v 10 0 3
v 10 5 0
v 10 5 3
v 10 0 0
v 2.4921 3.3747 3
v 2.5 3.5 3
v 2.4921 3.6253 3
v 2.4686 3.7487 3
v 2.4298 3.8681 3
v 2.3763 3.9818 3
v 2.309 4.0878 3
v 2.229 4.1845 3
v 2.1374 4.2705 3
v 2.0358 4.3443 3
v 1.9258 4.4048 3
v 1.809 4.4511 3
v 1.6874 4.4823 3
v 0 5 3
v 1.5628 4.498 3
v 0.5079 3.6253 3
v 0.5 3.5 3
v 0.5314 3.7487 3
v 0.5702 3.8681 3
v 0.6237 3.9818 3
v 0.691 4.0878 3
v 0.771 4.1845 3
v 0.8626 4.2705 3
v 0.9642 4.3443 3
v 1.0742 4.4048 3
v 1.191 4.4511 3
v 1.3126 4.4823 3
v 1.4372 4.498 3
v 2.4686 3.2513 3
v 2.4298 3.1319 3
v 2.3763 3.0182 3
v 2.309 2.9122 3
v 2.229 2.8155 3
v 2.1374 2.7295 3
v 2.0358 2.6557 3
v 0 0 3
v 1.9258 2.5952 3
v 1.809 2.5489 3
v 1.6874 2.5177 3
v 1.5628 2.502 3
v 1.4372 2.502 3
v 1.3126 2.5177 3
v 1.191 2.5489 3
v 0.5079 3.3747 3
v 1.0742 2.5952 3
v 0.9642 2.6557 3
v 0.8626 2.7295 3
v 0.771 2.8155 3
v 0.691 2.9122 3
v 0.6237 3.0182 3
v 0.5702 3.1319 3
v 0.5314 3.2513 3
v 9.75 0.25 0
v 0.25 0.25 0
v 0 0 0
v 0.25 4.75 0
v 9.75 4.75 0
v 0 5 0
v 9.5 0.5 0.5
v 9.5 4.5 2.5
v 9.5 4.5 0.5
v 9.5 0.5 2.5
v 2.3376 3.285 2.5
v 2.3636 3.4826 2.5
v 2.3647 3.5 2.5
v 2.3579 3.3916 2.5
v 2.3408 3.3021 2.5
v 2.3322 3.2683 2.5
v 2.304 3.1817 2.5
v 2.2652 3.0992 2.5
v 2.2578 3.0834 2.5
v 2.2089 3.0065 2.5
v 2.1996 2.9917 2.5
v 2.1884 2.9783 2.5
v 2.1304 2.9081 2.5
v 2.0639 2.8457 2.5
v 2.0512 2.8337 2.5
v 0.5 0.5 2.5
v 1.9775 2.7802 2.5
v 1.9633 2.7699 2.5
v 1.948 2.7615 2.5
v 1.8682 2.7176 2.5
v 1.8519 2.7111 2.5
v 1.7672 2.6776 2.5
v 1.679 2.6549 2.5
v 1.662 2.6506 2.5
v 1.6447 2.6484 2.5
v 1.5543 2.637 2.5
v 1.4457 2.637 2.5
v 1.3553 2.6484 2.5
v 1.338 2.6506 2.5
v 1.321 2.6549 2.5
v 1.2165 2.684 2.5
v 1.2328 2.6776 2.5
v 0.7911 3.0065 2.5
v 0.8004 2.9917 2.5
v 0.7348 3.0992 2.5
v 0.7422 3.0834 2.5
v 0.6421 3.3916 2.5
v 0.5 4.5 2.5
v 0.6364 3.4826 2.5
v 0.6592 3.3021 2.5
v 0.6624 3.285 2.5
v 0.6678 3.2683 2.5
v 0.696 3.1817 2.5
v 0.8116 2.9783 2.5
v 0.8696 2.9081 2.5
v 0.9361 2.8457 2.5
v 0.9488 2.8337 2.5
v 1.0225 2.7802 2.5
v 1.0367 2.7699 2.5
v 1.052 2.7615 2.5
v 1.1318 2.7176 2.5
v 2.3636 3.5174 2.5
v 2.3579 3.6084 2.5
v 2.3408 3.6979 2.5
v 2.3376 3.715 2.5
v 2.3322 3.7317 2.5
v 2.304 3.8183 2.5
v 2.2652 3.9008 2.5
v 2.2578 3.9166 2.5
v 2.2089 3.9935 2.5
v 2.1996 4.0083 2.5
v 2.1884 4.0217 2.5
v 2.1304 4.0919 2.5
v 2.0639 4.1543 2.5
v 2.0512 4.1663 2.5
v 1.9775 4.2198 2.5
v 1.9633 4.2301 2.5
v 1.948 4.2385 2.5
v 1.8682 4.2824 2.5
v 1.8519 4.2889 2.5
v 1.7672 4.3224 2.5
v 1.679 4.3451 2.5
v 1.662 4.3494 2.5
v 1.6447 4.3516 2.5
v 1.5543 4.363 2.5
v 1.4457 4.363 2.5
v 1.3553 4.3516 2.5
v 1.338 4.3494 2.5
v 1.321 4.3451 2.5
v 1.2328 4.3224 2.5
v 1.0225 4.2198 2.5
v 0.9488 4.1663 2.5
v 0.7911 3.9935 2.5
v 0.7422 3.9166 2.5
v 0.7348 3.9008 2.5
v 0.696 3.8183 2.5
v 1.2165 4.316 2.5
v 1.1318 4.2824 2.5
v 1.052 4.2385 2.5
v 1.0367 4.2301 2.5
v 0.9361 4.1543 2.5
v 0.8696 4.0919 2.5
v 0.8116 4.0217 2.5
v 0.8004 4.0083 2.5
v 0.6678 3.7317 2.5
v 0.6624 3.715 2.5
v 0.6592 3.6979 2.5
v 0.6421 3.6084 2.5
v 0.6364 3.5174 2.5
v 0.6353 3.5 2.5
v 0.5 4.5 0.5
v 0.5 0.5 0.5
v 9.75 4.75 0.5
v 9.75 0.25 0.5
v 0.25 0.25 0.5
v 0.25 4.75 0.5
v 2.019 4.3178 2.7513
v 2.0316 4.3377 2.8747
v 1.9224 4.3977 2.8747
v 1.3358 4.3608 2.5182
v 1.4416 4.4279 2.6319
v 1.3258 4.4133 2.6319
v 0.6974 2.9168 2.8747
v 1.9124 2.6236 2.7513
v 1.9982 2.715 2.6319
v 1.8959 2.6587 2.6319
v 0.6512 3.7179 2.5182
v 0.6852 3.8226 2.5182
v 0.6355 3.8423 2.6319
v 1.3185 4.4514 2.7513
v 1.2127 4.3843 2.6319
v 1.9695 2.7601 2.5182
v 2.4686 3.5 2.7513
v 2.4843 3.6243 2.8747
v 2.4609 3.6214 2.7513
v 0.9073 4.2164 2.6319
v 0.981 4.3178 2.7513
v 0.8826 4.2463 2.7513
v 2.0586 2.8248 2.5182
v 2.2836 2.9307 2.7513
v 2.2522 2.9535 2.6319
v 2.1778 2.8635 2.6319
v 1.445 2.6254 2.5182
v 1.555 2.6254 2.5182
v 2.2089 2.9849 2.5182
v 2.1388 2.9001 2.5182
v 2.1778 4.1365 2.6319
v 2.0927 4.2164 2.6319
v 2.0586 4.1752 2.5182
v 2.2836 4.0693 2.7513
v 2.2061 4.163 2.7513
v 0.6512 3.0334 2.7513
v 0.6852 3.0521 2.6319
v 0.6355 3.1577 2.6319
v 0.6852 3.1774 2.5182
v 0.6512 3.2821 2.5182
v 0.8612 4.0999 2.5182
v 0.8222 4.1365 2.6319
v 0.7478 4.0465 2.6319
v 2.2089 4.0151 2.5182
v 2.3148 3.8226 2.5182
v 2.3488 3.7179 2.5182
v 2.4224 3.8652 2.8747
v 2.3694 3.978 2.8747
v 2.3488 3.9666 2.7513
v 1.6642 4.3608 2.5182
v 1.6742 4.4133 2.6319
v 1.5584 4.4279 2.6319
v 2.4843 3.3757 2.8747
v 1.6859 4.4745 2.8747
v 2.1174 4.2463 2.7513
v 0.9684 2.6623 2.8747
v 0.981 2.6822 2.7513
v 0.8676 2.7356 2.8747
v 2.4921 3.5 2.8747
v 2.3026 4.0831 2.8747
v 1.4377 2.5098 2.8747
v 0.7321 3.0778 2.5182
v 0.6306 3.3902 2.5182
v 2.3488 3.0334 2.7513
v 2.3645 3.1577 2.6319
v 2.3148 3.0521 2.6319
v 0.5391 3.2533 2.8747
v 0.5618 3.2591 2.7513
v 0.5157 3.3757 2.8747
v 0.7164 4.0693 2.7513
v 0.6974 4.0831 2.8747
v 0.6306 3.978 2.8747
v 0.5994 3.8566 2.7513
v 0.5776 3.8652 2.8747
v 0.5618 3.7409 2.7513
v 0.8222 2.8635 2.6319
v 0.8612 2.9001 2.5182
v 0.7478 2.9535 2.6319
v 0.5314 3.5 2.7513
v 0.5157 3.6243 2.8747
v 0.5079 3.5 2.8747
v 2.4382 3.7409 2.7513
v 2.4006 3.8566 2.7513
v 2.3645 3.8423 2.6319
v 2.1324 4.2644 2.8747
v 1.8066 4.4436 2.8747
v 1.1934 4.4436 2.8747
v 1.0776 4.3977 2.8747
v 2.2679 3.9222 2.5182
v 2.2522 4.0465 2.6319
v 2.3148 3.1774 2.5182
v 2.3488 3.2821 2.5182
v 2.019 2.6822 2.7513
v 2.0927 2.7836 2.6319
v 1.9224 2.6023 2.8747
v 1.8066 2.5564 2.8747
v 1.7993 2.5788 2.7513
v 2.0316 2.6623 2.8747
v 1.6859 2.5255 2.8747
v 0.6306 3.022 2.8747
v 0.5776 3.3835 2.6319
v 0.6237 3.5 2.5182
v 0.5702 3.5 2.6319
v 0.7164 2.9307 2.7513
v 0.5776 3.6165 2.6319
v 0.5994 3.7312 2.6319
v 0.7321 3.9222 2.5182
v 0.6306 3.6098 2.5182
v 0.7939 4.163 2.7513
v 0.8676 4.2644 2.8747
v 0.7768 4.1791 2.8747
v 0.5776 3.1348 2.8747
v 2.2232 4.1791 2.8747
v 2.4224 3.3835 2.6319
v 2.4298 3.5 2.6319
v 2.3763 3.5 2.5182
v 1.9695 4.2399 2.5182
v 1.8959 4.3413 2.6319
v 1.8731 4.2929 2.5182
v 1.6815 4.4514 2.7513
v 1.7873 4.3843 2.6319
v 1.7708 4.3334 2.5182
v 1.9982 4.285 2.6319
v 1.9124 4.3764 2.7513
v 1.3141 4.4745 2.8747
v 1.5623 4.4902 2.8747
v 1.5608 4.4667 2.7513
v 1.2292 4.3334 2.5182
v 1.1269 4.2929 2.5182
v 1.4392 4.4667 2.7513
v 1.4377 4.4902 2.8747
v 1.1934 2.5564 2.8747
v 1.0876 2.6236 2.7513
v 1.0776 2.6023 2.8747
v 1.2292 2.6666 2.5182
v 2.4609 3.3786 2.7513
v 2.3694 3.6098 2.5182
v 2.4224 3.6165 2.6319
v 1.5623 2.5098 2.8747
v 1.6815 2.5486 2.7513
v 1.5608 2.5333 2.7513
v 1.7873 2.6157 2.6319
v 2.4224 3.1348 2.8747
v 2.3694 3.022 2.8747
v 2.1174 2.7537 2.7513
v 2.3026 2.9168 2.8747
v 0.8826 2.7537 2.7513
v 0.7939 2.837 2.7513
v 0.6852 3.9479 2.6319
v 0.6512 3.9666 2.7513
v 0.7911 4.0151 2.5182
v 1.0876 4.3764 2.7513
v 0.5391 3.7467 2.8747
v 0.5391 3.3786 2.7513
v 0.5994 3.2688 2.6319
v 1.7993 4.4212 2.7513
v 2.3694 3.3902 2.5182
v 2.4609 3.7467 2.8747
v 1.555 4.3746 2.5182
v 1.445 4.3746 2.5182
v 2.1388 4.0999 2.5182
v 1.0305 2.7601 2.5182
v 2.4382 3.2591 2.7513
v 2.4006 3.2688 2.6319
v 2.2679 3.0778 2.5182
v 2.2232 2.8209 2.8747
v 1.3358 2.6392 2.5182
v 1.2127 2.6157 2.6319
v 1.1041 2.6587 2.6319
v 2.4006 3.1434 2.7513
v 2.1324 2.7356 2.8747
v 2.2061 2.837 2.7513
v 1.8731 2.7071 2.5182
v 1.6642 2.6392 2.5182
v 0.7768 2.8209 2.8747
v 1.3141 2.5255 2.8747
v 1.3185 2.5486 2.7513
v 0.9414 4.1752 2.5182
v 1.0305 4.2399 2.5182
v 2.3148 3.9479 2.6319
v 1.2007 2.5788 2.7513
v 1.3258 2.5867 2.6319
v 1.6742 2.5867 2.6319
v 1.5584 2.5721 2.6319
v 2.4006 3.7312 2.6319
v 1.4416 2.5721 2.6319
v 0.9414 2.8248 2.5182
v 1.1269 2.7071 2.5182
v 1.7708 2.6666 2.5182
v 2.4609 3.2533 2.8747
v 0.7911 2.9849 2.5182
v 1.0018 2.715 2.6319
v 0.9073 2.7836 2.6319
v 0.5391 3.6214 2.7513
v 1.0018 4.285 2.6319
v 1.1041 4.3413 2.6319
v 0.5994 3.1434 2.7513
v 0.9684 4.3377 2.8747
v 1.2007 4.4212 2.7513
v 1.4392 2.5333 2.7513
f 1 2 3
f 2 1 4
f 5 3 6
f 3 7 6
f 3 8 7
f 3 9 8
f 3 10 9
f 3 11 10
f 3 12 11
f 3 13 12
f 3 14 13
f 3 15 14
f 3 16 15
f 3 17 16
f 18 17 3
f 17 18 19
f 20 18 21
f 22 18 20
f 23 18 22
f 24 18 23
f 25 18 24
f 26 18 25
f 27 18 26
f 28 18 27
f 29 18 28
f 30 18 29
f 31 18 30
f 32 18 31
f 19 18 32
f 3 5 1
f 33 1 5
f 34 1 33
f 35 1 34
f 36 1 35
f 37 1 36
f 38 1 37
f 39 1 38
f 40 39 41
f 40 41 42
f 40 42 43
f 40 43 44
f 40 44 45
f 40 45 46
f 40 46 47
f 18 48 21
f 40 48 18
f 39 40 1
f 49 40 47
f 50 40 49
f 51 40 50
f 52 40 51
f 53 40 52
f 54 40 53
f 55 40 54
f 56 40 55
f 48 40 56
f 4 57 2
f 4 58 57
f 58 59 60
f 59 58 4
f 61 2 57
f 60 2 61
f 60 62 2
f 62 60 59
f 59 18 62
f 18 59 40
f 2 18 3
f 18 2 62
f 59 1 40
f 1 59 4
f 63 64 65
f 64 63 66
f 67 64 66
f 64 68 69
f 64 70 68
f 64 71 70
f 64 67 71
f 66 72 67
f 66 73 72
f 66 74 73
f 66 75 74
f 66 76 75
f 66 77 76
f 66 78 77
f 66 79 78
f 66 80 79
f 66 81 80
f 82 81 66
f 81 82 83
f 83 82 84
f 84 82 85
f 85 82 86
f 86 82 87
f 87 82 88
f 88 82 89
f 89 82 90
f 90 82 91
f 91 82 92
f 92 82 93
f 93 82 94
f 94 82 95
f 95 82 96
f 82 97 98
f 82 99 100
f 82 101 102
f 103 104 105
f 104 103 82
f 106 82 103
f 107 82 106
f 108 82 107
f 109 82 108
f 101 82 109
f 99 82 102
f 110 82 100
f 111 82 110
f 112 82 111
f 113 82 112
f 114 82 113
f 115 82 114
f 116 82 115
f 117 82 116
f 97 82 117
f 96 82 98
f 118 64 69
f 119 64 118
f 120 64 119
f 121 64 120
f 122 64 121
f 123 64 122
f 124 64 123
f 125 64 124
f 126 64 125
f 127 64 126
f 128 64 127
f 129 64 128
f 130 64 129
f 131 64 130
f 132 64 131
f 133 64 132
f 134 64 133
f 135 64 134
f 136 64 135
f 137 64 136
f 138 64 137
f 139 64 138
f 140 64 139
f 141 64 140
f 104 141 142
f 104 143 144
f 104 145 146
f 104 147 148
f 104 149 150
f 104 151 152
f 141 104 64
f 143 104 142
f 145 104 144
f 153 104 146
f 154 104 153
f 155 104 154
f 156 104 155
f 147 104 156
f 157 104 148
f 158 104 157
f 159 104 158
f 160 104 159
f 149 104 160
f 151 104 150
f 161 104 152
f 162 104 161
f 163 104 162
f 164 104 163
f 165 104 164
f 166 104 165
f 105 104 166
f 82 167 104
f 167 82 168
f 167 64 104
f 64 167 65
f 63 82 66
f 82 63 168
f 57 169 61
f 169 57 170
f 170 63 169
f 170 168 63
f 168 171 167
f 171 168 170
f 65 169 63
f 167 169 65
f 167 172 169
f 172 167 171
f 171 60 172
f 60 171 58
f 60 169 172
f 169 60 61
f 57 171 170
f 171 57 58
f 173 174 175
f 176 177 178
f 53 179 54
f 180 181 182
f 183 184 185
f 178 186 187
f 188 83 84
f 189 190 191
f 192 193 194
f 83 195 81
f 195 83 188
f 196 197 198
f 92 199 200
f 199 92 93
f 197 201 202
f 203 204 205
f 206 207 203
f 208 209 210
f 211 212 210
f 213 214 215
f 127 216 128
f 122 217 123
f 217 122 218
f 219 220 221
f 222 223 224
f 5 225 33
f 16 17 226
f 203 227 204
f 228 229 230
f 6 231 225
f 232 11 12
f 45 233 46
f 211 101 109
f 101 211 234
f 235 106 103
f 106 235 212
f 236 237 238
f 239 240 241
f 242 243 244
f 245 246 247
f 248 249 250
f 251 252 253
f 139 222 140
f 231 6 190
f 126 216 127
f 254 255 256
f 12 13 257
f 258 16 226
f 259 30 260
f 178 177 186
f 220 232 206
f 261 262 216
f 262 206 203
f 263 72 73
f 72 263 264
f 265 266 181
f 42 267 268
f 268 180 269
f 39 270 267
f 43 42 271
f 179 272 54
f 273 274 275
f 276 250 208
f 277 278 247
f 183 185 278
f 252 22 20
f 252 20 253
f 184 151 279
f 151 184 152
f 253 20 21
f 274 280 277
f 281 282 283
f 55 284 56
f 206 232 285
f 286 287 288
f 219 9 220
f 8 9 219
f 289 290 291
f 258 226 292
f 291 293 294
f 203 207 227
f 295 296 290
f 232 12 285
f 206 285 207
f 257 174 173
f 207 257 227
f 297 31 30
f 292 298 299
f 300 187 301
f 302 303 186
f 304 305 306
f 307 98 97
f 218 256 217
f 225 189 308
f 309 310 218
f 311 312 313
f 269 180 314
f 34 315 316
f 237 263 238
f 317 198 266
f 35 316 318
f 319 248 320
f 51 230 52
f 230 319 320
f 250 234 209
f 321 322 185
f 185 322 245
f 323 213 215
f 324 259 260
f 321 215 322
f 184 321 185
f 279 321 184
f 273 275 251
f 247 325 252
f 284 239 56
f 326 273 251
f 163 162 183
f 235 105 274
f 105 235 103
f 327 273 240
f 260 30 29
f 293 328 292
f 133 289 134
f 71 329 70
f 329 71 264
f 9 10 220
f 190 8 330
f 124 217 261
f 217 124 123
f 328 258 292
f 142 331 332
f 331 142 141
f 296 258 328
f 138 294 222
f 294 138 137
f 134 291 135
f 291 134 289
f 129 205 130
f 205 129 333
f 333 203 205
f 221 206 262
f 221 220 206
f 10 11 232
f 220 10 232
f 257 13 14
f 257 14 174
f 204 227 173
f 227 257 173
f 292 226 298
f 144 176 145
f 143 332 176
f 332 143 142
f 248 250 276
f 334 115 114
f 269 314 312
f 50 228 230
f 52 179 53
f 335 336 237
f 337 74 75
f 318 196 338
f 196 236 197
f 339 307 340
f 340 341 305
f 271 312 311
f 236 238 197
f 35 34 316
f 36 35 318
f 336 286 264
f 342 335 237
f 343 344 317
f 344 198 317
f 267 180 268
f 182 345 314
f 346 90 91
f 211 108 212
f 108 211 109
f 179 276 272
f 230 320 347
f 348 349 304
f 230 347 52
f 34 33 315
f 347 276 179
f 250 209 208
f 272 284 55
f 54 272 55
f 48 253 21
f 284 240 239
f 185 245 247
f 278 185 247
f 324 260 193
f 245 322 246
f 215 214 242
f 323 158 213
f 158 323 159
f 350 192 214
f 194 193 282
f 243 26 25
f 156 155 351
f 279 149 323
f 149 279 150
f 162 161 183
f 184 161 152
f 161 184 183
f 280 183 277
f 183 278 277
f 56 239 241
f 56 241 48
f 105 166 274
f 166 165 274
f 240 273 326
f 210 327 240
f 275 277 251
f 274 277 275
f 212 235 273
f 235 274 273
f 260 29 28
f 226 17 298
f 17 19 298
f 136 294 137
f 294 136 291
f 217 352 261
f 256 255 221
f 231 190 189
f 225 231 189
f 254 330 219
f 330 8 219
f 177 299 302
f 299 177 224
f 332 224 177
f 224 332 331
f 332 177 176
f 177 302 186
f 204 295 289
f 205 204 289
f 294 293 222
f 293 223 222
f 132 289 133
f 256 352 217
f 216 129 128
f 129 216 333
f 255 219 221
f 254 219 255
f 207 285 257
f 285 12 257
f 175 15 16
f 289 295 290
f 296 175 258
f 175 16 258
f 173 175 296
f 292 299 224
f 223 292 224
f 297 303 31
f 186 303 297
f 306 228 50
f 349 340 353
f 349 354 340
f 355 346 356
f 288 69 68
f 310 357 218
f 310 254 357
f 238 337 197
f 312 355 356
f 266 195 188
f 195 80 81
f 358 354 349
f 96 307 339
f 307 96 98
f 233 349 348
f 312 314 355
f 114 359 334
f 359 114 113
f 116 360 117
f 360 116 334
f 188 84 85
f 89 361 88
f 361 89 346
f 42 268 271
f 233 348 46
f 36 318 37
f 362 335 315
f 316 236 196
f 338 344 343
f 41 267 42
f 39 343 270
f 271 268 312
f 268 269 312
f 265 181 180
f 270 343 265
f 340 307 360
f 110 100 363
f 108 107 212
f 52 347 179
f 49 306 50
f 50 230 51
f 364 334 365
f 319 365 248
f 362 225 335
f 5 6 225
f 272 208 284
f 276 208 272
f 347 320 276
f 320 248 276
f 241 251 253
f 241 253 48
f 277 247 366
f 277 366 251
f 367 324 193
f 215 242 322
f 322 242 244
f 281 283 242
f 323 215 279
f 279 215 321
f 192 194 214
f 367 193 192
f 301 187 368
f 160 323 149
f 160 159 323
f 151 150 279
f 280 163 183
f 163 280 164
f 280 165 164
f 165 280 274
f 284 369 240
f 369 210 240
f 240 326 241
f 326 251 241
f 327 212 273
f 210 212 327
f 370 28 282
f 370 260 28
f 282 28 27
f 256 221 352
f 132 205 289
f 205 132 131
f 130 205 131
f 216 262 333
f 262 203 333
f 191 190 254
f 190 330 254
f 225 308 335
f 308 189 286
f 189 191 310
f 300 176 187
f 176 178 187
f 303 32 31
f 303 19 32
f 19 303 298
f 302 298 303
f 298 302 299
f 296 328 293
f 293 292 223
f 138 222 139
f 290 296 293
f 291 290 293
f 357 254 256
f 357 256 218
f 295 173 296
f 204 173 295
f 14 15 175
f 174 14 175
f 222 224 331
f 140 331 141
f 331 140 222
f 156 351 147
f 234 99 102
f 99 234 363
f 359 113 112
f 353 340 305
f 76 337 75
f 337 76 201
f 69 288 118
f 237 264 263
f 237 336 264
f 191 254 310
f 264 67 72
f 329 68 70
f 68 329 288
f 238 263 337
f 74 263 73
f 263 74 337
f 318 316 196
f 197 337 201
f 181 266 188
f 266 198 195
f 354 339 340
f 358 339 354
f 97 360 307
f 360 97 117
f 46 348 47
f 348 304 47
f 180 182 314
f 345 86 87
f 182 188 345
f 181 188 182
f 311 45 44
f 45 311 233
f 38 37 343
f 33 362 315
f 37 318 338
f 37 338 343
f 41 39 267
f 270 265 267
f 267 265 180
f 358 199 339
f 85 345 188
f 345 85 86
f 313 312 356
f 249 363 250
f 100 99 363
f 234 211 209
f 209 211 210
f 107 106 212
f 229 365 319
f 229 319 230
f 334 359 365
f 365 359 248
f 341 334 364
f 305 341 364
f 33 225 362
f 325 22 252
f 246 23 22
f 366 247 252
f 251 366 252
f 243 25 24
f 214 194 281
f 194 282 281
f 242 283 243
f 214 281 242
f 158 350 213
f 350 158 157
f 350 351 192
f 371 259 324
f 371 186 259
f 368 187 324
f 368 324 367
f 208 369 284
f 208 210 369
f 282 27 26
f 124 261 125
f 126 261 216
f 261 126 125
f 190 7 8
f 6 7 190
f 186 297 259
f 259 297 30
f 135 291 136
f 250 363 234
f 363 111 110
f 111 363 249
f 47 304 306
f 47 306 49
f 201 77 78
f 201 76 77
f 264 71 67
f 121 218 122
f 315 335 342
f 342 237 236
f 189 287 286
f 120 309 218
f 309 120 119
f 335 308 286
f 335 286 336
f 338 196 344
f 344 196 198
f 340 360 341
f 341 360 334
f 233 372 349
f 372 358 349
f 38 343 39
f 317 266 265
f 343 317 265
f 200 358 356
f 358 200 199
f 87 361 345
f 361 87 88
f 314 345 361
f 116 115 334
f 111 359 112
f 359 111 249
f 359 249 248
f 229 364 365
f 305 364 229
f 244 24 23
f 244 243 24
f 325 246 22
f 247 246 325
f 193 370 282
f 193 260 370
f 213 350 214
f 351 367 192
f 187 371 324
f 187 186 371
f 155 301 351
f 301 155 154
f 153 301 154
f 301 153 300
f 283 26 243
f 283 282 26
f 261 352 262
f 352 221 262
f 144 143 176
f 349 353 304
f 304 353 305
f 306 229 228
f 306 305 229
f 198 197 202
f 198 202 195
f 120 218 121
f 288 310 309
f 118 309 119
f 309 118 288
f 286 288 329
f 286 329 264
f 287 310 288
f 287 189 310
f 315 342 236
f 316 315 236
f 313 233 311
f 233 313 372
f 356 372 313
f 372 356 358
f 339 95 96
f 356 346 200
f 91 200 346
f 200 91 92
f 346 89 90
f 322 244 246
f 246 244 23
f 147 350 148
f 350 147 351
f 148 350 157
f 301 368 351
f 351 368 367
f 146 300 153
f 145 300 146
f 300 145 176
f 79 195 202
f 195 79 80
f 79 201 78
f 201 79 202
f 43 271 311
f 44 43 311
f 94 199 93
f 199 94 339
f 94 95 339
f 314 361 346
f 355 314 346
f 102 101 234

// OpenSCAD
$fn = 50;

difference() {
	cube([10,5,3]);

	translate([0.5, 0.5, -0.5]) {
		cube([9, 4, 3]);
	}

	translate([0.25, 0.25, -0.5]) {
		cube([9.5, 4.5, 1]);
	}

	translate([1.5, 3.5, 3]){
		sphere(1);
	}
}
